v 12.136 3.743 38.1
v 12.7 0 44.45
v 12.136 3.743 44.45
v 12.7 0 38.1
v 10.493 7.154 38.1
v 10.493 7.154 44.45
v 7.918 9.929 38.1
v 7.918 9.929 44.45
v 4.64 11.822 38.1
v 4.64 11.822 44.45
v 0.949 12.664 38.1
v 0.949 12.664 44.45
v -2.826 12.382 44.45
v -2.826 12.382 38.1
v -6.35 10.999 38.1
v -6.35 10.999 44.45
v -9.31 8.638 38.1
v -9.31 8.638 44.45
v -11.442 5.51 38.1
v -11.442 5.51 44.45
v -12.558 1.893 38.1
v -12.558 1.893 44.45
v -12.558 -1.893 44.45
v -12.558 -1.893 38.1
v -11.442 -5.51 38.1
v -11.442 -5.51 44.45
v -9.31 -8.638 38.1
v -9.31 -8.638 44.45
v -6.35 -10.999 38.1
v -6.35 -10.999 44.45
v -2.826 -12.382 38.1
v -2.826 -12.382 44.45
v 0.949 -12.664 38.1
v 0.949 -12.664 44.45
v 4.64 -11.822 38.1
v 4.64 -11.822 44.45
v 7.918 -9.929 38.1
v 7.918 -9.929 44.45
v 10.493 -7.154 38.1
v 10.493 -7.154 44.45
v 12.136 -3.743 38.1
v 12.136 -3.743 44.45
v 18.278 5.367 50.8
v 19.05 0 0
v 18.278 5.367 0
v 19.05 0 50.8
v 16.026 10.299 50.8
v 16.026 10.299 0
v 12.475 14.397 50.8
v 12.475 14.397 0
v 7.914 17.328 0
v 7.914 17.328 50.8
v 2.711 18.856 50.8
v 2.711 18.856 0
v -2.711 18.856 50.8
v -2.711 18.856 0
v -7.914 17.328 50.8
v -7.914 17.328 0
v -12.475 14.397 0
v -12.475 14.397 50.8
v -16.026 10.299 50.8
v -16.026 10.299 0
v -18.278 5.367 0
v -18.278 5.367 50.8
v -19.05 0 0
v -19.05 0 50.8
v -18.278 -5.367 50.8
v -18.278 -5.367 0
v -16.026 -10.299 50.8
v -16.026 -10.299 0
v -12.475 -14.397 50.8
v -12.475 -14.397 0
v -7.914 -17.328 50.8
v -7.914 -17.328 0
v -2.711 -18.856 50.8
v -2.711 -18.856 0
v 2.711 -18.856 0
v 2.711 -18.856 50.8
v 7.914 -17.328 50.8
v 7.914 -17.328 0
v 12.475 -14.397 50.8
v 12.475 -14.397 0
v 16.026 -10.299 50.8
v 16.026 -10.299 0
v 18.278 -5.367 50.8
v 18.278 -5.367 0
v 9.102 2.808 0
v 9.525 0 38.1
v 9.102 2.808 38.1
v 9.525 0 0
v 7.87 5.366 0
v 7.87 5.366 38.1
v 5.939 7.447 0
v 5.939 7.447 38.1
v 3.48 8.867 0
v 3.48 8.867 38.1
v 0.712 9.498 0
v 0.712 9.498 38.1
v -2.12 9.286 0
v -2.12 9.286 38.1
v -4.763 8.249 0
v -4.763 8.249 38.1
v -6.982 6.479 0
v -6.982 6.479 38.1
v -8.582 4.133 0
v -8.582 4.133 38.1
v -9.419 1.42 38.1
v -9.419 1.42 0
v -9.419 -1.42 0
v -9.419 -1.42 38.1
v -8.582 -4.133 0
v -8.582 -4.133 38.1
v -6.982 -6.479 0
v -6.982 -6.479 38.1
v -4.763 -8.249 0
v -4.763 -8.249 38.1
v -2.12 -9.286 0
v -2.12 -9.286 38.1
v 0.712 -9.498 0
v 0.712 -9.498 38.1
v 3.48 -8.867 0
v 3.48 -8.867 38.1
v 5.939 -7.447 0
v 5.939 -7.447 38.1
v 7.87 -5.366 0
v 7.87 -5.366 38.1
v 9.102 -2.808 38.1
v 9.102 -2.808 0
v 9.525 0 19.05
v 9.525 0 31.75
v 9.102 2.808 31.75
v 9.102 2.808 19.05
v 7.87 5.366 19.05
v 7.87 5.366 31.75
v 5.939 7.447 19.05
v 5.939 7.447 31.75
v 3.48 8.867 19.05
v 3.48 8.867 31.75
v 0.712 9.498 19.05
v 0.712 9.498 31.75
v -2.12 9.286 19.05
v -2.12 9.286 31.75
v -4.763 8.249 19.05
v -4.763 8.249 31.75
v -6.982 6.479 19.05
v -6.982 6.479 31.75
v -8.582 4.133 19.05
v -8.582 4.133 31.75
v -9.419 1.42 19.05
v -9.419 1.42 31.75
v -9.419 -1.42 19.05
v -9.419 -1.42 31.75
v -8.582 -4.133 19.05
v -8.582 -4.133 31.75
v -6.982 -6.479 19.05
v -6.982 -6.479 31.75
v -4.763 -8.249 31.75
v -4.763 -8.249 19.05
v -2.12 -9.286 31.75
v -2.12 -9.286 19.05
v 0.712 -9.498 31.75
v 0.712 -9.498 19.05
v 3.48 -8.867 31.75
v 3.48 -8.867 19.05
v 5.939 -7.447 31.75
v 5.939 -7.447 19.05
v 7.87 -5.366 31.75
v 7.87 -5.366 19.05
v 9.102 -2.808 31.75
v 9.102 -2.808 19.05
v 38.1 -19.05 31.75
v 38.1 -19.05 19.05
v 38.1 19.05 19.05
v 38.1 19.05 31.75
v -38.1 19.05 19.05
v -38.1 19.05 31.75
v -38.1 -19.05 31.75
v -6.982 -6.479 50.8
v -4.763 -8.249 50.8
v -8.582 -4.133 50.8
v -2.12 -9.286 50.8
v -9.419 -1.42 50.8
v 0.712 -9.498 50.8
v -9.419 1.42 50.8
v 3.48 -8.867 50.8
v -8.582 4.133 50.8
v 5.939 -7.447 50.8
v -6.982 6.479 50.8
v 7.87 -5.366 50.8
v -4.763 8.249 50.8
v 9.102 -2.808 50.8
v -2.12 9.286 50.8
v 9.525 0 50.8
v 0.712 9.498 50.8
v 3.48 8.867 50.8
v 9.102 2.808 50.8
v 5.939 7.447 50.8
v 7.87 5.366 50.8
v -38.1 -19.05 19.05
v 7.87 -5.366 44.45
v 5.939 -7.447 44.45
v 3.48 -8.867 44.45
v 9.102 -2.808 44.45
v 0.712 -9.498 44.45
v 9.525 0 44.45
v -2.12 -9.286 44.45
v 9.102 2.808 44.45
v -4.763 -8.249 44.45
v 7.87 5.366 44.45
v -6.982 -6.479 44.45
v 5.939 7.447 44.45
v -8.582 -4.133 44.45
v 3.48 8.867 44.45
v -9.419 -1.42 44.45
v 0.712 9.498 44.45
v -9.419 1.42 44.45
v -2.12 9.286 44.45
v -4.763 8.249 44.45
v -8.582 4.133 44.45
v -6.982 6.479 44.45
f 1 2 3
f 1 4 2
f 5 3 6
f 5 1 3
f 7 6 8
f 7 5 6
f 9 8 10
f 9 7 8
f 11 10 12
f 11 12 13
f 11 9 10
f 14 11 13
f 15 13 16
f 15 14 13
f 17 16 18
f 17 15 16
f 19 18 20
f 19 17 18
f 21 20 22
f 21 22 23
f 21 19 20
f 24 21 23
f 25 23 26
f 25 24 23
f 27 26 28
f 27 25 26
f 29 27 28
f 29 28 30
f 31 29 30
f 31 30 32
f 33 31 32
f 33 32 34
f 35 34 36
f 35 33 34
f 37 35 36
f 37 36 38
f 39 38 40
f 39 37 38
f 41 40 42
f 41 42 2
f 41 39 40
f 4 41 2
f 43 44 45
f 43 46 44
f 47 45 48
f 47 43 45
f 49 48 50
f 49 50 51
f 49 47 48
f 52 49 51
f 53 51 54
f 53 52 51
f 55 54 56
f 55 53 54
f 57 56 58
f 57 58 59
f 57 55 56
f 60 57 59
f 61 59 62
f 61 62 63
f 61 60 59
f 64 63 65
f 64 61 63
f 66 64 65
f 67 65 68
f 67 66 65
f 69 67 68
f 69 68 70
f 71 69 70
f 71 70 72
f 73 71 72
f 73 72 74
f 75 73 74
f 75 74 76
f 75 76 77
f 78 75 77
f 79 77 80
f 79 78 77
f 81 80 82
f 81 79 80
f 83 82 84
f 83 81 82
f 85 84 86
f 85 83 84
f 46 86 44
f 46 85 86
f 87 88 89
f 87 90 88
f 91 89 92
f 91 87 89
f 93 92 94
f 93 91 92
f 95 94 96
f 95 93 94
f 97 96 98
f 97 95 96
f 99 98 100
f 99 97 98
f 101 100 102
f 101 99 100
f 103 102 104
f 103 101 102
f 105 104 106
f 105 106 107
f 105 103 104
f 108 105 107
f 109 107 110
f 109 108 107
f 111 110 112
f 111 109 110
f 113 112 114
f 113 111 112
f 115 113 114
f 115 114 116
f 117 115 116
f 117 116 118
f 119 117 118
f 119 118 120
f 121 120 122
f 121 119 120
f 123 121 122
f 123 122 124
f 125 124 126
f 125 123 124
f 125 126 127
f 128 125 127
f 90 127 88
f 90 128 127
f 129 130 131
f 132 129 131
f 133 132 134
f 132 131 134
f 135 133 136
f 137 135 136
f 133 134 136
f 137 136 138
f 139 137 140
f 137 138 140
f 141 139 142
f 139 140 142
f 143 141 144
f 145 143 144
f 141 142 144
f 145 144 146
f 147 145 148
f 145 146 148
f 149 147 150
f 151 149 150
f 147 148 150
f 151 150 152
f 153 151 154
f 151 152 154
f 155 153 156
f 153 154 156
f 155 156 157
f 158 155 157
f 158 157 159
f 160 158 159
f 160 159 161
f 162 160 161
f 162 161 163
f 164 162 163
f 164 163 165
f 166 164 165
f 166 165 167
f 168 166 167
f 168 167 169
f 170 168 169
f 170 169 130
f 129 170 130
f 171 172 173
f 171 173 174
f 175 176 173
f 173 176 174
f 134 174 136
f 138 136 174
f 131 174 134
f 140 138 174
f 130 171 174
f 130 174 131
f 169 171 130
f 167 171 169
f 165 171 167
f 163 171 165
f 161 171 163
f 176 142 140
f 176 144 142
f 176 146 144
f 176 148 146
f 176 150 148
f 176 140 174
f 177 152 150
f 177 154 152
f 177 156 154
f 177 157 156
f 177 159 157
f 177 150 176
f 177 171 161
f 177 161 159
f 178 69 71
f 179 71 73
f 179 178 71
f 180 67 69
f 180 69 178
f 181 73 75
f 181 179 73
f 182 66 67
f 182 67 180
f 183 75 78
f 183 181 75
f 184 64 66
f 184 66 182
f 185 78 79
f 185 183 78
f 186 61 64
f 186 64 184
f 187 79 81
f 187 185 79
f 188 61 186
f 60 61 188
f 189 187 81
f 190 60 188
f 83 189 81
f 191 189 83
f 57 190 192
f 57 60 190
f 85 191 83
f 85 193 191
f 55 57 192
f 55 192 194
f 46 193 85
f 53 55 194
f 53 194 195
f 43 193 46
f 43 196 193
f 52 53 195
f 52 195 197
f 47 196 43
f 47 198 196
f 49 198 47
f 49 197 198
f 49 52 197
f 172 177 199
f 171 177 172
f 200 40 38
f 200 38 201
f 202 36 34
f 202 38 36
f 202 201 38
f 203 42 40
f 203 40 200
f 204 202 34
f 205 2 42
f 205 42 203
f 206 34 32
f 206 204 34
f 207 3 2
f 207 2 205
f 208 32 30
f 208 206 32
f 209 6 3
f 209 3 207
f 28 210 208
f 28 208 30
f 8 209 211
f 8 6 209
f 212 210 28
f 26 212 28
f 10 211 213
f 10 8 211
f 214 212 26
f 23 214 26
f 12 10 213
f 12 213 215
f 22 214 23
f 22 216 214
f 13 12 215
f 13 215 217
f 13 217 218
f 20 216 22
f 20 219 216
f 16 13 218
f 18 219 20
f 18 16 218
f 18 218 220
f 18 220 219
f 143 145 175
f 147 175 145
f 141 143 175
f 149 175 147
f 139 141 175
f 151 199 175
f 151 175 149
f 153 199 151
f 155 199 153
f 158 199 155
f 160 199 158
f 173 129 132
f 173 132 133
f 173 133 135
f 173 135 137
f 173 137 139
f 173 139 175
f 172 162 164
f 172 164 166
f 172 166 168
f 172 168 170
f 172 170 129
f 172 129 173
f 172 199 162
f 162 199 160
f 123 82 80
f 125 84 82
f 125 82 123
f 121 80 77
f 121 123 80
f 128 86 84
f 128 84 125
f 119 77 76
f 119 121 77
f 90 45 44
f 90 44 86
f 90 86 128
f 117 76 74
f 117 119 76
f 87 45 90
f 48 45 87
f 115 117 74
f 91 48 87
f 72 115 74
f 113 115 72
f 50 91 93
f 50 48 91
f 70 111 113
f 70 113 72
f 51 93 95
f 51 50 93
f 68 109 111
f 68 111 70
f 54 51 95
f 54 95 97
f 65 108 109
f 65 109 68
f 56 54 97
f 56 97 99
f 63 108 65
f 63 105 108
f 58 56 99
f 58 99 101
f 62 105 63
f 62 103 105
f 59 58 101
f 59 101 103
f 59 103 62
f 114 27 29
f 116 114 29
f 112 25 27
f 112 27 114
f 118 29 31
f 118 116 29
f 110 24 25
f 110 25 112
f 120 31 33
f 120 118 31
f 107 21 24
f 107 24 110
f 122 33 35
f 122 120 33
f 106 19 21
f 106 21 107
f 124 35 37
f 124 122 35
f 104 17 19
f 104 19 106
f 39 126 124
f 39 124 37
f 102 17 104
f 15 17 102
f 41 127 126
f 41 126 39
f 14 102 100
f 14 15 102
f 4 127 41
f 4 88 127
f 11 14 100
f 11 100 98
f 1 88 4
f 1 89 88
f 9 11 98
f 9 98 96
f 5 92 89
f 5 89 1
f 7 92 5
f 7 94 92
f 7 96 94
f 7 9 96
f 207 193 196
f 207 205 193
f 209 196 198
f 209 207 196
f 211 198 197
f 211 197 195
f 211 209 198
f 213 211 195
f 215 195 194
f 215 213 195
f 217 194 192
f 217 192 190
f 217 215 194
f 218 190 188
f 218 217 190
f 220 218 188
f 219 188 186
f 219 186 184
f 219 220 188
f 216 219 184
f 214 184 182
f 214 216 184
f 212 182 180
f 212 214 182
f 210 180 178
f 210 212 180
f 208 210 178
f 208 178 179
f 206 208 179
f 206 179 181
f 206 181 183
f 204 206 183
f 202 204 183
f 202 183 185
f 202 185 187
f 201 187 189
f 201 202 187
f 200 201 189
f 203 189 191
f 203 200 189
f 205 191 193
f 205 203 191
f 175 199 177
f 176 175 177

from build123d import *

# Parameters (mm, degrees)
F0_W     = 9.525
F0_H     = 19.05
F0_H_2   = 12.7
F0_W_2   = 38.1
F0_W_3   = 19.05
F2_DEPTH = 19.05
F3_R     = 9.525
F4_DEPTH = 31.751


with BuildPart() as f1:
    # F0 (on Front) → F1 (revolve)
    with BuildSketch(Plane.XZ):
        Polygon((12.7, 38.1), (9.525, 38.1), (9.525, 31.75), (19.05, 31.75), (19.05, 50.8), (9.525, 50.8), (9.525, 44.45), (12.7, 44.45), align=None)
        with Locations((14.2875, 9.525)):
            Rectangle(F0_W, F0_H)
        with Locations((14.2875, 25.4)):
            Rectangle(F0_W, F0_H_2)
    revolve(axis=Axis((0, 0, 25.4), (0, 0, 1)))


with BuildPart() as f2:
    # F0 (on Front) → F2 (new body, symmetric)
    with BuildSketch(Plane.XZ):
        with Locations((-19.05, 25.4)):
            Rectangle(F0_W_2, F0_H_2)
        with Locations((28.575, 25.4)):
            Rectangle(F0_W_3, F0_H_2)
        with Locations((4.7625, 25.4)):
            Rectangle(F0_W, F0_H_2)
        with Locations((14.2875, 25.4)):
            Rectangle(F0_W, F0_H_2)
    extrude(amount=F2_DEPTH, both=True)

    # F3 (on face) → F4 (cut, through all)
    with BuildSketch(Plane.XY.offset(31.75)):
        Circle(F3_R)
    extrude(amount=-F4_DEPTH, mode=Mode.SUBTRACT)


solid = Compound([f1.part, f2.part])
